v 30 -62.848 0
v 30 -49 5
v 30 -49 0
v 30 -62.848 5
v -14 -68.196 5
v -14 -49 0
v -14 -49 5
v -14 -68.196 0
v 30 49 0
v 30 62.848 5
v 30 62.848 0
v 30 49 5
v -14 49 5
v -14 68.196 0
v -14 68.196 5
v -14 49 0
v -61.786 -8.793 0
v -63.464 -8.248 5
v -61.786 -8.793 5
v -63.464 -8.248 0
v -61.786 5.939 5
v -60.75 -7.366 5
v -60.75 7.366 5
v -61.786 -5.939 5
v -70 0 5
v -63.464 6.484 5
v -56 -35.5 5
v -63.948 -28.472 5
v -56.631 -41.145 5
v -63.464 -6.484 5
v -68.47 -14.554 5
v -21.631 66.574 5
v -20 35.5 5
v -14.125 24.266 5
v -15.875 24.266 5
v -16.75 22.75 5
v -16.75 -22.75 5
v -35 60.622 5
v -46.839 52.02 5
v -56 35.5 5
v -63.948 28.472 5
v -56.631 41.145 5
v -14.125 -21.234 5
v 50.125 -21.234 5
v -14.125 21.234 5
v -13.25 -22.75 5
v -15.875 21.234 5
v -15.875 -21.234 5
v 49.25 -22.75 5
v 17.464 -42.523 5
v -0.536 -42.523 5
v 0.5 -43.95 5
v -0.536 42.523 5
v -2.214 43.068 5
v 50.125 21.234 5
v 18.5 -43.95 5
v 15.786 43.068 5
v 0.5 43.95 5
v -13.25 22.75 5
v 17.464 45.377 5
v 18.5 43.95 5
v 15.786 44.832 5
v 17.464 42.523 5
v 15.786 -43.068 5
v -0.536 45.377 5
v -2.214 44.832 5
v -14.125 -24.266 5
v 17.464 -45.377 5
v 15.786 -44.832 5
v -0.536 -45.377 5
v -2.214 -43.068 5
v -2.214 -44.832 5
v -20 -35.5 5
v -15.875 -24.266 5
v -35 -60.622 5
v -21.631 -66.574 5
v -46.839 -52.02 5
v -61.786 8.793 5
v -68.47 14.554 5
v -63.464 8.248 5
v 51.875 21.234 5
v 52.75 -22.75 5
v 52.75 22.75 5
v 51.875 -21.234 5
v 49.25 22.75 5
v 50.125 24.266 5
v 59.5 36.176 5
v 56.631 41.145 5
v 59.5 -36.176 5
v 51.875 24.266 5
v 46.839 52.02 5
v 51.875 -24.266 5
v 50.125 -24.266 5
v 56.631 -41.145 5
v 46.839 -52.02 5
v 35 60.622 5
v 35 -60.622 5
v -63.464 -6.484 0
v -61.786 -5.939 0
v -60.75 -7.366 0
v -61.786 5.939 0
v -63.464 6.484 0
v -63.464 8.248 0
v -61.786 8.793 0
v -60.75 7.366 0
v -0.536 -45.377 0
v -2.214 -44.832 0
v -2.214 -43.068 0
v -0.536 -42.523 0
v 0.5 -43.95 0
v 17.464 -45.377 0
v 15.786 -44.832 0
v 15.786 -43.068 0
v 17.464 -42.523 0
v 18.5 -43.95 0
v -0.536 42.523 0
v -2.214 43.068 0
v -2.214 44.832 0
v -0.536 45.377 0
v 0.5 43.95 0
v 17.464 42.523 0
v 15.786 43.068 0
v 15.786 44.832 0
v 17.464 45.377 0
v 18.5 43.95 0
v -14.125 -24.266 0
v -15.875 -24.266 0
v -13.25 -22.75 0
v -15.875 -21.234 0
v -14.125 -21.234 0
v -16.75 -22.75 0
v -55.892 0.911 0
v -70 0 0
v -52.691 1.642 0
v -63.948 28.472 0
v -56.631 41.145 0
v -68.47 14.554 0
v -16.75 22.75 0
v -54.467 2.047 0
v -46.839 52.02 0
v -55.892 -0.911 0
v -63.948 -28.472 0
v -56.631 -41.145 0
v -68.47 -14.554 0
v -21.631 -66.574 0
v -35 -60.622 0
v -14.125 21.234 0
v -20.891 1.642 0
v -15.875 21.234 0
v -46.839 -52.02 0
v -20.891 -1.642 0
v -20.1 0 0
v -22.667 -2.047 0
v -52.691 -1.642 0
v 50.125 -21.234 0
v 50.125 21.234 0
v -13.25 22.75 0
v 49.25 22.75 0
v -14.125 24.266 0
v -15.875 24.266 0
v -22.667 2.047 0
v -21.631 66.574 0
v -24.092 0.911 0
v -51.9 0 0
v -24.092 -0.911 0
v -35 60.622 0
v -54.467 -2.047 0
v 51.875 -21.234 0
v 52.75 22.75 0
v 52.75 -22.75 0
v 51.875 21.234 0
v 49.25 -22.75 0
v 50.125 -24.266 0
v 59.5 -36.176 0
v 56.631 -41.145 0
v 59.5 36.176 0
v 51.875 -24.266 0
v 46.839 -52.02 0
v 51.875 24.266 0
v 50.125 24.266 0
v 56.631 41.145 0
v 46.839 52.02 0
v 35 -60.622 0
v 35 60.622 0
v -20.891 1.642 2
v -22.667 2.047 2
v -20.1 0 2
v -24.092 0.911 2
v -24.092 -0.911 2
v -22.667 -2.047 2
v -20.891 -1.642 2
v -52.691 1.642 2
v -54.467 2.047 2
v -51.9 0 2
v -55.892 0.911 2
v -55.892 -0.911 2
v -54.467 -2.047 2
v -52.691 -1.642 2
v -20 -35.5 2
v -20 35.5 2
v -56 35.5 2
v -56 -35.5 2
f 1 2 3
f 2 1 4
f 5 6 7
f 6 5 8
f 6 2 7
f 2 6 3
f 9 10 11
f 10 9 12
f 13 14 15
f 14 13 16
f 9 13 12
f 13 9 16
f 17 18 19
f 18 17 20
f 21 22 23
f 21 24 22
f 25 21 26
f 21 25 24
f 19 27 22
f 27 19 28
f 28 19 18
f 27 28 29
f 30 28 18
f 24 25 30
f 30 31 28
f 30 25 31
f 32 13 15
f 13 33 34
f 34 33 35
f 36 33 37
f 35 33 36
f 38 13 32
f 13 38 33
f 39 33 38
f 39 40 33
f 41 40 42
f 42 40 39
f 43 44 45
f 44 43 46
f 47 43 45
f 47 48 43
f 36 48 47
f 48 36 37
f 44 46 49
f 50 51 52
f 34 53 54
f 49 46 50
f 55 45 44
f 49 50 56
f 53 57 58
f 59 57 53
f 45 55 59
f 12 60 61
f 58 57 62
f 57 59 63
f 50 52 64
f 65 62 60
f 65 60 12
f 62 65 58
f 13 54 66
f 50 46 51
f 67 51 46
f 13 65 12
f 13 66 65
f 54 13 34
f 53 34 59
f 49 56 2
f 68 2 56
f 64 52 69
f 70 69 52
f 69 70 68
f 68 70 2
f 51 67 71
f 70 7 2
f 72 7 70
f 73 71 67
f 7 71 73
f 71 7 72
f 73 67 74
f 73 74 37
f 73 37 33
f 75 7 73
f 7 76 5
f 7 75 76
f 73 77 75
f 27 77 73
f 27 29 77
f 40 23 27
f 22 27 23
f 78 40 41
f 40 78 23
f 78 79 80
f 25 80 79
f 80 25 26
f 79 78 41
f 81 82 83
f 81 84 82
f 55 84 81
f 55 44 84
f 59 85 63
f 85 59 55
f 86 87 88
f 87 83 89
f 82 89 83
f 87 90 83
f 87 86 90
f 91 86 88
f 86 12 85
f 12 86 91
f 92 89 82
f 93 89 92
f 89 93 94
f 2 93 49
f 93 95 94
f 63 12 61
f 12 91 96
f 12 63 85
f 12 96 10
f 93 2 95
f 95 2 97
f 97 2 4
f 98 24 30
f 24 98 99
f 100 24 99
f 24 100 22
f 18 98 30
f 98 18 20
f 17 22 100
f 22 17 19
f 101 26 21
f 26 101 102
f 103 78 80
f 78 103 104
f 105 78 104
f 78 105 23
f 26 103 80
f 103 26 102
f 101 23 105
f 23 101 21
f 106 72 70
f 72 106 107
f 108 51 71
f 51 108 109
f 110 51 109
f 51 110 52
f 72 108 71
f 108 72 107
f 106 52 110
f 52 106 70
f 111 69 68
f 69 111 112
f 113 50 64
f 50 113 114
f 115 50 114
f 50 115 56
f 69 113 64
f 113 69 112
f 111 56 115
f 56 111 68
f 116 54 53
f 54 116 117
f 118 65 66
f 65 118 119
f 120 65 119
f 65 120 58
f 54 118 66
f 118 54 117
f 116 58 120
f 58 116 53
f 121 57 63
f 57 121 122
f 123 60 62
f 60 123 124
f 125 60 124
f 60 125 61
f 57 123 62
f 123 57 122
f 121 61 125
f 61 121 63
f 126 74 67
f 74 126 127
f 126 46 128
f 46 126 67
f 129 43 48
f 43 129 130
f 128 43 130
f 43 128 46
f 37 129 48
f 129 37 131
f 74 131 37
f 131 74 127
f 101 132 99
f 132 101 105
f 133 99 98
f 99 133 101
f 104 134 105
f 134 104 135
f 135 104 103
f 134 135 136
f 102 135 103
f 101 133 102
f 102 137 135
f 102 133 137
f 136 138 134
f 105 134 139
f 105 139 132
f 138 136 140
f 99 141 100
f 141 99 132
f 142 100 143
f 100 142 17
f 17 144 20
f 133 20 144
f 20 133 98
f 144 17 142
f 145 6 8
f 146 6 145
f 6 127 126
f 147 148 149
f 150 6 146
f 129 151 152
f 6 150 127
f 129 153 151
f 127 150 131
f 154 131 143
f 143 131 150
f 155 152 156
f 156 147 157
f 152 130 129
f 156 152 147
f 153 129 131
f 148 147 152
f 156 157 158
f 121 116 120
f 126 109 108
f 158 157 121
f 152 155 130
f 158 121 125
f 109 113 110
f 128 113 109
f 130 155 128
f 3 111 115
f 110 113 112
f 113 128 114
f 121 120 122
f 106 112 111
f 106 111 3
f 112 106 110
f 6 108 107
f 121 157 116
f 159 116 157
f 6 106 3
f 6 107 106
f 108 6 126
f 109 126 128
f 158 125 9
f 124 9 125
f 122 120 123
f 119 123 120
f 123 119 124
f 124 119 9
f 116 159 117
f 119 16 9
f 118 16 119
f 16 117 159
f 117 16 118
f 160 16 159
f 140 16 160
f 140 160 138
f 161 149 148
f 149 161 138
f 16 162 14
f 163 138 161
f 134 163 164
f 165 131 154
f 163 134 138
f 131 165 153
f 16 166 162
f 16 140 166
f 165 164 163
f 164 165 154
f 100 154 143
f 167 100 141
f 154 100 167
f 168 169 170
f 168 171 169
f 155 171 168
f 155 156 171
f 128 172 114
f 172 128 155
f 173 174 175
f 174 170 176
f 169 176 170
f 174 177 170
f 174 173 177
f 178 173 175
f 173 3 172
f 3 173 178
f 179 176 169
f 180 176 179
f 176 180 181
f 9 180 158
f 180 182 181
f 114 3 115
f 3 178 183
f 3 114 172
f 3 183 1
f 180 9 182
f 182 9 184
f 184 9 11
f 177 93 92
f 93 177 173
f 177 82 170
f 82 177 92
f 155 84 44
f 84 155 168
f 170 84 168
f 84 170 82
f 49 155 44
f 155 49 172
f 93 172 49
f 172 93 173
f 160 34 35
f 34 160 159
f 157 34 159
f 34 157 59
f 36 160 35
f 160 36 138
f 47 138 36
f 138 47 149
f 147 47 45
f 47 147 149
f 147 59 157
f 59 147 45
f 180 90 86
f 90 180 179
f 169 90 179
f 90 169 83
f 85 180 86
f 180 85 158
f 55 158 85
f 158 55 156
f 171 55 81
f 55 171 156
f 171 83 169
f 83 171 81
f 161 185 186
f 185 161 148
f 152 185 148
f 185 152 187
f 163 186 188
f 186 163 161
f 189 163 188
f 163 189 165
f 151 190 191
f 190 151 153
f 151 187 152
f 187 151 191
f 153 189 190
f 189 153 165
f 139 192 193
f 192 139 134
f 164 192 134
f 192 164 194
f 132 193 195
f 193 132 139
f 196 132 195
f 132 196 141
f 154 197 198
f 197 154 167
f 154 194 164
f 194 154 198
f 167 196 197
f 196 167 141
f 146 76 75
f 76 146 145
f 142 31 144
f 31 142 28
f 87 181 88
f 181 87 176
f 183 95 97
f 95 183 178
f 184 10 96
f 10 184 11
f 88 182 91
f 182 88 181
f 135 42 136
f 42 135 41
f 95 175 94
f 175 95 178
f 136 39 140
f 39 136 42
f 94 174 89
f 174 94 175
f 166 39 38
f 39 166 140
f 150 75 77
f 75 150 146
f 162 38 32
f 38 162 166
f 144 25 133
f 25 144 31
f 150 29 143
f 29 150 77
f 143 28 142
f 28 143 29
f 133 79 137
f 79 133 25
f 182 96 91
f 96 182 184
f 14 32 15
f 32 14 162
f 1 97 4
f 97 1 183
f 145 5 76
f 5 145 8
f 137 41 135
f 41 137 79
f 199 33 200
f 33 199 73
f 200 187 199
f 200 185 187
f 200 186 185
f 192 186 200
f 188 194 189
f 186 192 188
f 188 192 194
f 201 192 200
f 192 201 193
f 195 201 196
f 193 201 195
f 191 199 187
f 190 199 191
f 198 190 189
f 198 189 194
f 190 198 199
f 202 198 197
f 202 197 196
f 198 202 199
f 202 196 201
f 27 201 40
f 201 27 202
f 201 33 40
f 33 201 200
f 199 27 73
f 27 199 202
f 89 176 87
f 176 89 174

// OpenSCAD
/*
###########################
# 2014 Micromouse Chassis #
###########################
Author: Darrel Weng

Chassis for 2014 IEEE micromouse competition.
Team: Darrel, Sunil, Ryan, Ethan

Numbers are in units of mm, but unit_scale variable allows
the unit to change.

**********************************************
*** MAKERWARE ASSUMES STL VALUES ARE IN mm ***
**********************************************

*/

// ALL UNITS IN mm
unit_scale 		= 		1;
//================================================================================
// Chassis Parameters
chassis_rad		= 		70*unit_scale;
chassis_height 	= 		5*unit_scale;
battery_dep 		= 		3*unit_scale;
battery_len 		= 		71*unit_scale;
battery_width 	= 		36*unit_scale;
pcb_len 			= 		69.5*unit_scale;
pcb_width 		= 		50.7*unit_scale;
tire_width 		= 		44*unit_scale;
tire_thick 		= 		21*unit_scale;
tire_offset 		= 		8*unit_scale;
screw1_rad		=		(3.0/2)*unit_scale;
screw2_rad		=		(3.5/2)*unit_scale;
ziptie_rad 		=		2.1*unit_scale;
// note that motor & caster measurements are maximum measurements, 
// and only measurements of the part that will on on the chassis
motor_width		=		26.6*unit_scale;
motor_height		=		13.35*unit_scale;
motor_len		=		16.33*unit_scale;
caster_width		=		15.5*unit_scale;
caster_len		=		20.32*unit_scale;
caster_height	=		13.9*unit_scale;
// need motor holes, caster holes, pcb holes; offsets are wrt origin
caster_offset	=		7.366*unit_scale;
motor_offset		=		9*unit_scale;
motor2_offset	=		(8.5*unit_scale)/2;
pcb_xoffset		=		(66*unit_scale)/2;
pcb_yoffset		=		(45.5*unit_scale)/2;
//================================================================================
// Translation Parameters
battery_trans 	= 		[-1*(chassis_rad/2)-(3*unit_scale),0,(battery_dep/2)+(chassis_height-battery_dep)];
cutoff_trans 	= 		[chassis_rad+(7*unit_scale),0,0];
pcbdummy_trans 	= 		[(chassis_rad/2)-(17*unit_scale),0,7*battery_dep];
castdummy_trans	=		[-1*(chassis_rad-(caster_width/2)),0,-1*caster_height/2];
//================================================================================
// Dummy Shapes (comment out for .stl file)
//
//// pcb dummy
//color("blue")
//translate(pcbdummy_trans) 
//cube(size=[pcb_len,pcb_width,battery_dep],center=true);
//
//// motor dummy
//for (i=[0:1]) {
//	color("blue")
//	translate([tire_offset,((i-.5)/abs(i-.5))*(chassis_rad-tire_thick-(motor_len/2)),chassis_height+(motor_height/2)])
//	cube(size=[motor_width,motor_len,motor_height],center=true);
//}
//
//// caster dummy
//color("blue") 
//translate(castdummy_trans)
//cube(size=[caster_width,caster_len,caster_height],center=true);
//================================================================================

// Chassis

difference() {
	// main body
	cylinder(h=chassis_height,r=chassis_rad);
	// battery depression
	translate(battery_trans) 
	cube(size=[battery_width,battery_len,battery_dep],center=true);
	// cut off end
	translate(cutoff_trans) 
	cube(size=[chassis_rad/2,chassis_rad*2,chassis_height*2],center=true);
	// wheel cutouts
	for(i=[0:1]) {
		translate([tire_offset,((i-.5)/abs(i-.5))*(chassis_rad-(tire_thick/2)),chassis_height/2]) 
		cube(size=[tire_width,tire_thick,tire_width],center=true);
	}
	// caster screws
	for (i=[0:1]) {
		translate([-1*((chassis_rad)-(caster_width/2)),((i-.5)/abs(i-.5))*caster_offset,-1*chassis_height])
		cylinder(h=chassis_height*2,r=screw1_rad);
	}
	// motor screws
	for (i=[0:1]){
		for (j=[0:1]) {
			translate([((j-.5)/abs(j-.5))*(motor_offset)+tire_offset,((i-.5)/abs(i-.5))*(chassis_rad-tire_thick-(screw1_rad)-(motor2_offset-screw1_rad)-0.8*unit_scale),-1*chassis_height/2])
			cylinder(h=chassis_height*2,r=screw1_rad);
		}
	}
	// pcb screws
	for (i=[0:1]) {
		for (j=[0:1]) {
			translate([((j-.5)/abs(j-.5))*(pcb_xoffset)+pcbdummy_trans[0],((i-.5)/abs(i-.5))*(pcb_yoffset),0])
			cylinder(h=chassis_height*5,r=screw2_rad);
		}
	}
	// ziptie holes
	for (i=[0:1]) {
		translate([-1*(battery_width/2 + 2*ziptie_rad + (battery_width-2*ziptie_rad)*i),0,0])
		cylinder(h=chassis_height, r=ziptie_rad);
	}
}
